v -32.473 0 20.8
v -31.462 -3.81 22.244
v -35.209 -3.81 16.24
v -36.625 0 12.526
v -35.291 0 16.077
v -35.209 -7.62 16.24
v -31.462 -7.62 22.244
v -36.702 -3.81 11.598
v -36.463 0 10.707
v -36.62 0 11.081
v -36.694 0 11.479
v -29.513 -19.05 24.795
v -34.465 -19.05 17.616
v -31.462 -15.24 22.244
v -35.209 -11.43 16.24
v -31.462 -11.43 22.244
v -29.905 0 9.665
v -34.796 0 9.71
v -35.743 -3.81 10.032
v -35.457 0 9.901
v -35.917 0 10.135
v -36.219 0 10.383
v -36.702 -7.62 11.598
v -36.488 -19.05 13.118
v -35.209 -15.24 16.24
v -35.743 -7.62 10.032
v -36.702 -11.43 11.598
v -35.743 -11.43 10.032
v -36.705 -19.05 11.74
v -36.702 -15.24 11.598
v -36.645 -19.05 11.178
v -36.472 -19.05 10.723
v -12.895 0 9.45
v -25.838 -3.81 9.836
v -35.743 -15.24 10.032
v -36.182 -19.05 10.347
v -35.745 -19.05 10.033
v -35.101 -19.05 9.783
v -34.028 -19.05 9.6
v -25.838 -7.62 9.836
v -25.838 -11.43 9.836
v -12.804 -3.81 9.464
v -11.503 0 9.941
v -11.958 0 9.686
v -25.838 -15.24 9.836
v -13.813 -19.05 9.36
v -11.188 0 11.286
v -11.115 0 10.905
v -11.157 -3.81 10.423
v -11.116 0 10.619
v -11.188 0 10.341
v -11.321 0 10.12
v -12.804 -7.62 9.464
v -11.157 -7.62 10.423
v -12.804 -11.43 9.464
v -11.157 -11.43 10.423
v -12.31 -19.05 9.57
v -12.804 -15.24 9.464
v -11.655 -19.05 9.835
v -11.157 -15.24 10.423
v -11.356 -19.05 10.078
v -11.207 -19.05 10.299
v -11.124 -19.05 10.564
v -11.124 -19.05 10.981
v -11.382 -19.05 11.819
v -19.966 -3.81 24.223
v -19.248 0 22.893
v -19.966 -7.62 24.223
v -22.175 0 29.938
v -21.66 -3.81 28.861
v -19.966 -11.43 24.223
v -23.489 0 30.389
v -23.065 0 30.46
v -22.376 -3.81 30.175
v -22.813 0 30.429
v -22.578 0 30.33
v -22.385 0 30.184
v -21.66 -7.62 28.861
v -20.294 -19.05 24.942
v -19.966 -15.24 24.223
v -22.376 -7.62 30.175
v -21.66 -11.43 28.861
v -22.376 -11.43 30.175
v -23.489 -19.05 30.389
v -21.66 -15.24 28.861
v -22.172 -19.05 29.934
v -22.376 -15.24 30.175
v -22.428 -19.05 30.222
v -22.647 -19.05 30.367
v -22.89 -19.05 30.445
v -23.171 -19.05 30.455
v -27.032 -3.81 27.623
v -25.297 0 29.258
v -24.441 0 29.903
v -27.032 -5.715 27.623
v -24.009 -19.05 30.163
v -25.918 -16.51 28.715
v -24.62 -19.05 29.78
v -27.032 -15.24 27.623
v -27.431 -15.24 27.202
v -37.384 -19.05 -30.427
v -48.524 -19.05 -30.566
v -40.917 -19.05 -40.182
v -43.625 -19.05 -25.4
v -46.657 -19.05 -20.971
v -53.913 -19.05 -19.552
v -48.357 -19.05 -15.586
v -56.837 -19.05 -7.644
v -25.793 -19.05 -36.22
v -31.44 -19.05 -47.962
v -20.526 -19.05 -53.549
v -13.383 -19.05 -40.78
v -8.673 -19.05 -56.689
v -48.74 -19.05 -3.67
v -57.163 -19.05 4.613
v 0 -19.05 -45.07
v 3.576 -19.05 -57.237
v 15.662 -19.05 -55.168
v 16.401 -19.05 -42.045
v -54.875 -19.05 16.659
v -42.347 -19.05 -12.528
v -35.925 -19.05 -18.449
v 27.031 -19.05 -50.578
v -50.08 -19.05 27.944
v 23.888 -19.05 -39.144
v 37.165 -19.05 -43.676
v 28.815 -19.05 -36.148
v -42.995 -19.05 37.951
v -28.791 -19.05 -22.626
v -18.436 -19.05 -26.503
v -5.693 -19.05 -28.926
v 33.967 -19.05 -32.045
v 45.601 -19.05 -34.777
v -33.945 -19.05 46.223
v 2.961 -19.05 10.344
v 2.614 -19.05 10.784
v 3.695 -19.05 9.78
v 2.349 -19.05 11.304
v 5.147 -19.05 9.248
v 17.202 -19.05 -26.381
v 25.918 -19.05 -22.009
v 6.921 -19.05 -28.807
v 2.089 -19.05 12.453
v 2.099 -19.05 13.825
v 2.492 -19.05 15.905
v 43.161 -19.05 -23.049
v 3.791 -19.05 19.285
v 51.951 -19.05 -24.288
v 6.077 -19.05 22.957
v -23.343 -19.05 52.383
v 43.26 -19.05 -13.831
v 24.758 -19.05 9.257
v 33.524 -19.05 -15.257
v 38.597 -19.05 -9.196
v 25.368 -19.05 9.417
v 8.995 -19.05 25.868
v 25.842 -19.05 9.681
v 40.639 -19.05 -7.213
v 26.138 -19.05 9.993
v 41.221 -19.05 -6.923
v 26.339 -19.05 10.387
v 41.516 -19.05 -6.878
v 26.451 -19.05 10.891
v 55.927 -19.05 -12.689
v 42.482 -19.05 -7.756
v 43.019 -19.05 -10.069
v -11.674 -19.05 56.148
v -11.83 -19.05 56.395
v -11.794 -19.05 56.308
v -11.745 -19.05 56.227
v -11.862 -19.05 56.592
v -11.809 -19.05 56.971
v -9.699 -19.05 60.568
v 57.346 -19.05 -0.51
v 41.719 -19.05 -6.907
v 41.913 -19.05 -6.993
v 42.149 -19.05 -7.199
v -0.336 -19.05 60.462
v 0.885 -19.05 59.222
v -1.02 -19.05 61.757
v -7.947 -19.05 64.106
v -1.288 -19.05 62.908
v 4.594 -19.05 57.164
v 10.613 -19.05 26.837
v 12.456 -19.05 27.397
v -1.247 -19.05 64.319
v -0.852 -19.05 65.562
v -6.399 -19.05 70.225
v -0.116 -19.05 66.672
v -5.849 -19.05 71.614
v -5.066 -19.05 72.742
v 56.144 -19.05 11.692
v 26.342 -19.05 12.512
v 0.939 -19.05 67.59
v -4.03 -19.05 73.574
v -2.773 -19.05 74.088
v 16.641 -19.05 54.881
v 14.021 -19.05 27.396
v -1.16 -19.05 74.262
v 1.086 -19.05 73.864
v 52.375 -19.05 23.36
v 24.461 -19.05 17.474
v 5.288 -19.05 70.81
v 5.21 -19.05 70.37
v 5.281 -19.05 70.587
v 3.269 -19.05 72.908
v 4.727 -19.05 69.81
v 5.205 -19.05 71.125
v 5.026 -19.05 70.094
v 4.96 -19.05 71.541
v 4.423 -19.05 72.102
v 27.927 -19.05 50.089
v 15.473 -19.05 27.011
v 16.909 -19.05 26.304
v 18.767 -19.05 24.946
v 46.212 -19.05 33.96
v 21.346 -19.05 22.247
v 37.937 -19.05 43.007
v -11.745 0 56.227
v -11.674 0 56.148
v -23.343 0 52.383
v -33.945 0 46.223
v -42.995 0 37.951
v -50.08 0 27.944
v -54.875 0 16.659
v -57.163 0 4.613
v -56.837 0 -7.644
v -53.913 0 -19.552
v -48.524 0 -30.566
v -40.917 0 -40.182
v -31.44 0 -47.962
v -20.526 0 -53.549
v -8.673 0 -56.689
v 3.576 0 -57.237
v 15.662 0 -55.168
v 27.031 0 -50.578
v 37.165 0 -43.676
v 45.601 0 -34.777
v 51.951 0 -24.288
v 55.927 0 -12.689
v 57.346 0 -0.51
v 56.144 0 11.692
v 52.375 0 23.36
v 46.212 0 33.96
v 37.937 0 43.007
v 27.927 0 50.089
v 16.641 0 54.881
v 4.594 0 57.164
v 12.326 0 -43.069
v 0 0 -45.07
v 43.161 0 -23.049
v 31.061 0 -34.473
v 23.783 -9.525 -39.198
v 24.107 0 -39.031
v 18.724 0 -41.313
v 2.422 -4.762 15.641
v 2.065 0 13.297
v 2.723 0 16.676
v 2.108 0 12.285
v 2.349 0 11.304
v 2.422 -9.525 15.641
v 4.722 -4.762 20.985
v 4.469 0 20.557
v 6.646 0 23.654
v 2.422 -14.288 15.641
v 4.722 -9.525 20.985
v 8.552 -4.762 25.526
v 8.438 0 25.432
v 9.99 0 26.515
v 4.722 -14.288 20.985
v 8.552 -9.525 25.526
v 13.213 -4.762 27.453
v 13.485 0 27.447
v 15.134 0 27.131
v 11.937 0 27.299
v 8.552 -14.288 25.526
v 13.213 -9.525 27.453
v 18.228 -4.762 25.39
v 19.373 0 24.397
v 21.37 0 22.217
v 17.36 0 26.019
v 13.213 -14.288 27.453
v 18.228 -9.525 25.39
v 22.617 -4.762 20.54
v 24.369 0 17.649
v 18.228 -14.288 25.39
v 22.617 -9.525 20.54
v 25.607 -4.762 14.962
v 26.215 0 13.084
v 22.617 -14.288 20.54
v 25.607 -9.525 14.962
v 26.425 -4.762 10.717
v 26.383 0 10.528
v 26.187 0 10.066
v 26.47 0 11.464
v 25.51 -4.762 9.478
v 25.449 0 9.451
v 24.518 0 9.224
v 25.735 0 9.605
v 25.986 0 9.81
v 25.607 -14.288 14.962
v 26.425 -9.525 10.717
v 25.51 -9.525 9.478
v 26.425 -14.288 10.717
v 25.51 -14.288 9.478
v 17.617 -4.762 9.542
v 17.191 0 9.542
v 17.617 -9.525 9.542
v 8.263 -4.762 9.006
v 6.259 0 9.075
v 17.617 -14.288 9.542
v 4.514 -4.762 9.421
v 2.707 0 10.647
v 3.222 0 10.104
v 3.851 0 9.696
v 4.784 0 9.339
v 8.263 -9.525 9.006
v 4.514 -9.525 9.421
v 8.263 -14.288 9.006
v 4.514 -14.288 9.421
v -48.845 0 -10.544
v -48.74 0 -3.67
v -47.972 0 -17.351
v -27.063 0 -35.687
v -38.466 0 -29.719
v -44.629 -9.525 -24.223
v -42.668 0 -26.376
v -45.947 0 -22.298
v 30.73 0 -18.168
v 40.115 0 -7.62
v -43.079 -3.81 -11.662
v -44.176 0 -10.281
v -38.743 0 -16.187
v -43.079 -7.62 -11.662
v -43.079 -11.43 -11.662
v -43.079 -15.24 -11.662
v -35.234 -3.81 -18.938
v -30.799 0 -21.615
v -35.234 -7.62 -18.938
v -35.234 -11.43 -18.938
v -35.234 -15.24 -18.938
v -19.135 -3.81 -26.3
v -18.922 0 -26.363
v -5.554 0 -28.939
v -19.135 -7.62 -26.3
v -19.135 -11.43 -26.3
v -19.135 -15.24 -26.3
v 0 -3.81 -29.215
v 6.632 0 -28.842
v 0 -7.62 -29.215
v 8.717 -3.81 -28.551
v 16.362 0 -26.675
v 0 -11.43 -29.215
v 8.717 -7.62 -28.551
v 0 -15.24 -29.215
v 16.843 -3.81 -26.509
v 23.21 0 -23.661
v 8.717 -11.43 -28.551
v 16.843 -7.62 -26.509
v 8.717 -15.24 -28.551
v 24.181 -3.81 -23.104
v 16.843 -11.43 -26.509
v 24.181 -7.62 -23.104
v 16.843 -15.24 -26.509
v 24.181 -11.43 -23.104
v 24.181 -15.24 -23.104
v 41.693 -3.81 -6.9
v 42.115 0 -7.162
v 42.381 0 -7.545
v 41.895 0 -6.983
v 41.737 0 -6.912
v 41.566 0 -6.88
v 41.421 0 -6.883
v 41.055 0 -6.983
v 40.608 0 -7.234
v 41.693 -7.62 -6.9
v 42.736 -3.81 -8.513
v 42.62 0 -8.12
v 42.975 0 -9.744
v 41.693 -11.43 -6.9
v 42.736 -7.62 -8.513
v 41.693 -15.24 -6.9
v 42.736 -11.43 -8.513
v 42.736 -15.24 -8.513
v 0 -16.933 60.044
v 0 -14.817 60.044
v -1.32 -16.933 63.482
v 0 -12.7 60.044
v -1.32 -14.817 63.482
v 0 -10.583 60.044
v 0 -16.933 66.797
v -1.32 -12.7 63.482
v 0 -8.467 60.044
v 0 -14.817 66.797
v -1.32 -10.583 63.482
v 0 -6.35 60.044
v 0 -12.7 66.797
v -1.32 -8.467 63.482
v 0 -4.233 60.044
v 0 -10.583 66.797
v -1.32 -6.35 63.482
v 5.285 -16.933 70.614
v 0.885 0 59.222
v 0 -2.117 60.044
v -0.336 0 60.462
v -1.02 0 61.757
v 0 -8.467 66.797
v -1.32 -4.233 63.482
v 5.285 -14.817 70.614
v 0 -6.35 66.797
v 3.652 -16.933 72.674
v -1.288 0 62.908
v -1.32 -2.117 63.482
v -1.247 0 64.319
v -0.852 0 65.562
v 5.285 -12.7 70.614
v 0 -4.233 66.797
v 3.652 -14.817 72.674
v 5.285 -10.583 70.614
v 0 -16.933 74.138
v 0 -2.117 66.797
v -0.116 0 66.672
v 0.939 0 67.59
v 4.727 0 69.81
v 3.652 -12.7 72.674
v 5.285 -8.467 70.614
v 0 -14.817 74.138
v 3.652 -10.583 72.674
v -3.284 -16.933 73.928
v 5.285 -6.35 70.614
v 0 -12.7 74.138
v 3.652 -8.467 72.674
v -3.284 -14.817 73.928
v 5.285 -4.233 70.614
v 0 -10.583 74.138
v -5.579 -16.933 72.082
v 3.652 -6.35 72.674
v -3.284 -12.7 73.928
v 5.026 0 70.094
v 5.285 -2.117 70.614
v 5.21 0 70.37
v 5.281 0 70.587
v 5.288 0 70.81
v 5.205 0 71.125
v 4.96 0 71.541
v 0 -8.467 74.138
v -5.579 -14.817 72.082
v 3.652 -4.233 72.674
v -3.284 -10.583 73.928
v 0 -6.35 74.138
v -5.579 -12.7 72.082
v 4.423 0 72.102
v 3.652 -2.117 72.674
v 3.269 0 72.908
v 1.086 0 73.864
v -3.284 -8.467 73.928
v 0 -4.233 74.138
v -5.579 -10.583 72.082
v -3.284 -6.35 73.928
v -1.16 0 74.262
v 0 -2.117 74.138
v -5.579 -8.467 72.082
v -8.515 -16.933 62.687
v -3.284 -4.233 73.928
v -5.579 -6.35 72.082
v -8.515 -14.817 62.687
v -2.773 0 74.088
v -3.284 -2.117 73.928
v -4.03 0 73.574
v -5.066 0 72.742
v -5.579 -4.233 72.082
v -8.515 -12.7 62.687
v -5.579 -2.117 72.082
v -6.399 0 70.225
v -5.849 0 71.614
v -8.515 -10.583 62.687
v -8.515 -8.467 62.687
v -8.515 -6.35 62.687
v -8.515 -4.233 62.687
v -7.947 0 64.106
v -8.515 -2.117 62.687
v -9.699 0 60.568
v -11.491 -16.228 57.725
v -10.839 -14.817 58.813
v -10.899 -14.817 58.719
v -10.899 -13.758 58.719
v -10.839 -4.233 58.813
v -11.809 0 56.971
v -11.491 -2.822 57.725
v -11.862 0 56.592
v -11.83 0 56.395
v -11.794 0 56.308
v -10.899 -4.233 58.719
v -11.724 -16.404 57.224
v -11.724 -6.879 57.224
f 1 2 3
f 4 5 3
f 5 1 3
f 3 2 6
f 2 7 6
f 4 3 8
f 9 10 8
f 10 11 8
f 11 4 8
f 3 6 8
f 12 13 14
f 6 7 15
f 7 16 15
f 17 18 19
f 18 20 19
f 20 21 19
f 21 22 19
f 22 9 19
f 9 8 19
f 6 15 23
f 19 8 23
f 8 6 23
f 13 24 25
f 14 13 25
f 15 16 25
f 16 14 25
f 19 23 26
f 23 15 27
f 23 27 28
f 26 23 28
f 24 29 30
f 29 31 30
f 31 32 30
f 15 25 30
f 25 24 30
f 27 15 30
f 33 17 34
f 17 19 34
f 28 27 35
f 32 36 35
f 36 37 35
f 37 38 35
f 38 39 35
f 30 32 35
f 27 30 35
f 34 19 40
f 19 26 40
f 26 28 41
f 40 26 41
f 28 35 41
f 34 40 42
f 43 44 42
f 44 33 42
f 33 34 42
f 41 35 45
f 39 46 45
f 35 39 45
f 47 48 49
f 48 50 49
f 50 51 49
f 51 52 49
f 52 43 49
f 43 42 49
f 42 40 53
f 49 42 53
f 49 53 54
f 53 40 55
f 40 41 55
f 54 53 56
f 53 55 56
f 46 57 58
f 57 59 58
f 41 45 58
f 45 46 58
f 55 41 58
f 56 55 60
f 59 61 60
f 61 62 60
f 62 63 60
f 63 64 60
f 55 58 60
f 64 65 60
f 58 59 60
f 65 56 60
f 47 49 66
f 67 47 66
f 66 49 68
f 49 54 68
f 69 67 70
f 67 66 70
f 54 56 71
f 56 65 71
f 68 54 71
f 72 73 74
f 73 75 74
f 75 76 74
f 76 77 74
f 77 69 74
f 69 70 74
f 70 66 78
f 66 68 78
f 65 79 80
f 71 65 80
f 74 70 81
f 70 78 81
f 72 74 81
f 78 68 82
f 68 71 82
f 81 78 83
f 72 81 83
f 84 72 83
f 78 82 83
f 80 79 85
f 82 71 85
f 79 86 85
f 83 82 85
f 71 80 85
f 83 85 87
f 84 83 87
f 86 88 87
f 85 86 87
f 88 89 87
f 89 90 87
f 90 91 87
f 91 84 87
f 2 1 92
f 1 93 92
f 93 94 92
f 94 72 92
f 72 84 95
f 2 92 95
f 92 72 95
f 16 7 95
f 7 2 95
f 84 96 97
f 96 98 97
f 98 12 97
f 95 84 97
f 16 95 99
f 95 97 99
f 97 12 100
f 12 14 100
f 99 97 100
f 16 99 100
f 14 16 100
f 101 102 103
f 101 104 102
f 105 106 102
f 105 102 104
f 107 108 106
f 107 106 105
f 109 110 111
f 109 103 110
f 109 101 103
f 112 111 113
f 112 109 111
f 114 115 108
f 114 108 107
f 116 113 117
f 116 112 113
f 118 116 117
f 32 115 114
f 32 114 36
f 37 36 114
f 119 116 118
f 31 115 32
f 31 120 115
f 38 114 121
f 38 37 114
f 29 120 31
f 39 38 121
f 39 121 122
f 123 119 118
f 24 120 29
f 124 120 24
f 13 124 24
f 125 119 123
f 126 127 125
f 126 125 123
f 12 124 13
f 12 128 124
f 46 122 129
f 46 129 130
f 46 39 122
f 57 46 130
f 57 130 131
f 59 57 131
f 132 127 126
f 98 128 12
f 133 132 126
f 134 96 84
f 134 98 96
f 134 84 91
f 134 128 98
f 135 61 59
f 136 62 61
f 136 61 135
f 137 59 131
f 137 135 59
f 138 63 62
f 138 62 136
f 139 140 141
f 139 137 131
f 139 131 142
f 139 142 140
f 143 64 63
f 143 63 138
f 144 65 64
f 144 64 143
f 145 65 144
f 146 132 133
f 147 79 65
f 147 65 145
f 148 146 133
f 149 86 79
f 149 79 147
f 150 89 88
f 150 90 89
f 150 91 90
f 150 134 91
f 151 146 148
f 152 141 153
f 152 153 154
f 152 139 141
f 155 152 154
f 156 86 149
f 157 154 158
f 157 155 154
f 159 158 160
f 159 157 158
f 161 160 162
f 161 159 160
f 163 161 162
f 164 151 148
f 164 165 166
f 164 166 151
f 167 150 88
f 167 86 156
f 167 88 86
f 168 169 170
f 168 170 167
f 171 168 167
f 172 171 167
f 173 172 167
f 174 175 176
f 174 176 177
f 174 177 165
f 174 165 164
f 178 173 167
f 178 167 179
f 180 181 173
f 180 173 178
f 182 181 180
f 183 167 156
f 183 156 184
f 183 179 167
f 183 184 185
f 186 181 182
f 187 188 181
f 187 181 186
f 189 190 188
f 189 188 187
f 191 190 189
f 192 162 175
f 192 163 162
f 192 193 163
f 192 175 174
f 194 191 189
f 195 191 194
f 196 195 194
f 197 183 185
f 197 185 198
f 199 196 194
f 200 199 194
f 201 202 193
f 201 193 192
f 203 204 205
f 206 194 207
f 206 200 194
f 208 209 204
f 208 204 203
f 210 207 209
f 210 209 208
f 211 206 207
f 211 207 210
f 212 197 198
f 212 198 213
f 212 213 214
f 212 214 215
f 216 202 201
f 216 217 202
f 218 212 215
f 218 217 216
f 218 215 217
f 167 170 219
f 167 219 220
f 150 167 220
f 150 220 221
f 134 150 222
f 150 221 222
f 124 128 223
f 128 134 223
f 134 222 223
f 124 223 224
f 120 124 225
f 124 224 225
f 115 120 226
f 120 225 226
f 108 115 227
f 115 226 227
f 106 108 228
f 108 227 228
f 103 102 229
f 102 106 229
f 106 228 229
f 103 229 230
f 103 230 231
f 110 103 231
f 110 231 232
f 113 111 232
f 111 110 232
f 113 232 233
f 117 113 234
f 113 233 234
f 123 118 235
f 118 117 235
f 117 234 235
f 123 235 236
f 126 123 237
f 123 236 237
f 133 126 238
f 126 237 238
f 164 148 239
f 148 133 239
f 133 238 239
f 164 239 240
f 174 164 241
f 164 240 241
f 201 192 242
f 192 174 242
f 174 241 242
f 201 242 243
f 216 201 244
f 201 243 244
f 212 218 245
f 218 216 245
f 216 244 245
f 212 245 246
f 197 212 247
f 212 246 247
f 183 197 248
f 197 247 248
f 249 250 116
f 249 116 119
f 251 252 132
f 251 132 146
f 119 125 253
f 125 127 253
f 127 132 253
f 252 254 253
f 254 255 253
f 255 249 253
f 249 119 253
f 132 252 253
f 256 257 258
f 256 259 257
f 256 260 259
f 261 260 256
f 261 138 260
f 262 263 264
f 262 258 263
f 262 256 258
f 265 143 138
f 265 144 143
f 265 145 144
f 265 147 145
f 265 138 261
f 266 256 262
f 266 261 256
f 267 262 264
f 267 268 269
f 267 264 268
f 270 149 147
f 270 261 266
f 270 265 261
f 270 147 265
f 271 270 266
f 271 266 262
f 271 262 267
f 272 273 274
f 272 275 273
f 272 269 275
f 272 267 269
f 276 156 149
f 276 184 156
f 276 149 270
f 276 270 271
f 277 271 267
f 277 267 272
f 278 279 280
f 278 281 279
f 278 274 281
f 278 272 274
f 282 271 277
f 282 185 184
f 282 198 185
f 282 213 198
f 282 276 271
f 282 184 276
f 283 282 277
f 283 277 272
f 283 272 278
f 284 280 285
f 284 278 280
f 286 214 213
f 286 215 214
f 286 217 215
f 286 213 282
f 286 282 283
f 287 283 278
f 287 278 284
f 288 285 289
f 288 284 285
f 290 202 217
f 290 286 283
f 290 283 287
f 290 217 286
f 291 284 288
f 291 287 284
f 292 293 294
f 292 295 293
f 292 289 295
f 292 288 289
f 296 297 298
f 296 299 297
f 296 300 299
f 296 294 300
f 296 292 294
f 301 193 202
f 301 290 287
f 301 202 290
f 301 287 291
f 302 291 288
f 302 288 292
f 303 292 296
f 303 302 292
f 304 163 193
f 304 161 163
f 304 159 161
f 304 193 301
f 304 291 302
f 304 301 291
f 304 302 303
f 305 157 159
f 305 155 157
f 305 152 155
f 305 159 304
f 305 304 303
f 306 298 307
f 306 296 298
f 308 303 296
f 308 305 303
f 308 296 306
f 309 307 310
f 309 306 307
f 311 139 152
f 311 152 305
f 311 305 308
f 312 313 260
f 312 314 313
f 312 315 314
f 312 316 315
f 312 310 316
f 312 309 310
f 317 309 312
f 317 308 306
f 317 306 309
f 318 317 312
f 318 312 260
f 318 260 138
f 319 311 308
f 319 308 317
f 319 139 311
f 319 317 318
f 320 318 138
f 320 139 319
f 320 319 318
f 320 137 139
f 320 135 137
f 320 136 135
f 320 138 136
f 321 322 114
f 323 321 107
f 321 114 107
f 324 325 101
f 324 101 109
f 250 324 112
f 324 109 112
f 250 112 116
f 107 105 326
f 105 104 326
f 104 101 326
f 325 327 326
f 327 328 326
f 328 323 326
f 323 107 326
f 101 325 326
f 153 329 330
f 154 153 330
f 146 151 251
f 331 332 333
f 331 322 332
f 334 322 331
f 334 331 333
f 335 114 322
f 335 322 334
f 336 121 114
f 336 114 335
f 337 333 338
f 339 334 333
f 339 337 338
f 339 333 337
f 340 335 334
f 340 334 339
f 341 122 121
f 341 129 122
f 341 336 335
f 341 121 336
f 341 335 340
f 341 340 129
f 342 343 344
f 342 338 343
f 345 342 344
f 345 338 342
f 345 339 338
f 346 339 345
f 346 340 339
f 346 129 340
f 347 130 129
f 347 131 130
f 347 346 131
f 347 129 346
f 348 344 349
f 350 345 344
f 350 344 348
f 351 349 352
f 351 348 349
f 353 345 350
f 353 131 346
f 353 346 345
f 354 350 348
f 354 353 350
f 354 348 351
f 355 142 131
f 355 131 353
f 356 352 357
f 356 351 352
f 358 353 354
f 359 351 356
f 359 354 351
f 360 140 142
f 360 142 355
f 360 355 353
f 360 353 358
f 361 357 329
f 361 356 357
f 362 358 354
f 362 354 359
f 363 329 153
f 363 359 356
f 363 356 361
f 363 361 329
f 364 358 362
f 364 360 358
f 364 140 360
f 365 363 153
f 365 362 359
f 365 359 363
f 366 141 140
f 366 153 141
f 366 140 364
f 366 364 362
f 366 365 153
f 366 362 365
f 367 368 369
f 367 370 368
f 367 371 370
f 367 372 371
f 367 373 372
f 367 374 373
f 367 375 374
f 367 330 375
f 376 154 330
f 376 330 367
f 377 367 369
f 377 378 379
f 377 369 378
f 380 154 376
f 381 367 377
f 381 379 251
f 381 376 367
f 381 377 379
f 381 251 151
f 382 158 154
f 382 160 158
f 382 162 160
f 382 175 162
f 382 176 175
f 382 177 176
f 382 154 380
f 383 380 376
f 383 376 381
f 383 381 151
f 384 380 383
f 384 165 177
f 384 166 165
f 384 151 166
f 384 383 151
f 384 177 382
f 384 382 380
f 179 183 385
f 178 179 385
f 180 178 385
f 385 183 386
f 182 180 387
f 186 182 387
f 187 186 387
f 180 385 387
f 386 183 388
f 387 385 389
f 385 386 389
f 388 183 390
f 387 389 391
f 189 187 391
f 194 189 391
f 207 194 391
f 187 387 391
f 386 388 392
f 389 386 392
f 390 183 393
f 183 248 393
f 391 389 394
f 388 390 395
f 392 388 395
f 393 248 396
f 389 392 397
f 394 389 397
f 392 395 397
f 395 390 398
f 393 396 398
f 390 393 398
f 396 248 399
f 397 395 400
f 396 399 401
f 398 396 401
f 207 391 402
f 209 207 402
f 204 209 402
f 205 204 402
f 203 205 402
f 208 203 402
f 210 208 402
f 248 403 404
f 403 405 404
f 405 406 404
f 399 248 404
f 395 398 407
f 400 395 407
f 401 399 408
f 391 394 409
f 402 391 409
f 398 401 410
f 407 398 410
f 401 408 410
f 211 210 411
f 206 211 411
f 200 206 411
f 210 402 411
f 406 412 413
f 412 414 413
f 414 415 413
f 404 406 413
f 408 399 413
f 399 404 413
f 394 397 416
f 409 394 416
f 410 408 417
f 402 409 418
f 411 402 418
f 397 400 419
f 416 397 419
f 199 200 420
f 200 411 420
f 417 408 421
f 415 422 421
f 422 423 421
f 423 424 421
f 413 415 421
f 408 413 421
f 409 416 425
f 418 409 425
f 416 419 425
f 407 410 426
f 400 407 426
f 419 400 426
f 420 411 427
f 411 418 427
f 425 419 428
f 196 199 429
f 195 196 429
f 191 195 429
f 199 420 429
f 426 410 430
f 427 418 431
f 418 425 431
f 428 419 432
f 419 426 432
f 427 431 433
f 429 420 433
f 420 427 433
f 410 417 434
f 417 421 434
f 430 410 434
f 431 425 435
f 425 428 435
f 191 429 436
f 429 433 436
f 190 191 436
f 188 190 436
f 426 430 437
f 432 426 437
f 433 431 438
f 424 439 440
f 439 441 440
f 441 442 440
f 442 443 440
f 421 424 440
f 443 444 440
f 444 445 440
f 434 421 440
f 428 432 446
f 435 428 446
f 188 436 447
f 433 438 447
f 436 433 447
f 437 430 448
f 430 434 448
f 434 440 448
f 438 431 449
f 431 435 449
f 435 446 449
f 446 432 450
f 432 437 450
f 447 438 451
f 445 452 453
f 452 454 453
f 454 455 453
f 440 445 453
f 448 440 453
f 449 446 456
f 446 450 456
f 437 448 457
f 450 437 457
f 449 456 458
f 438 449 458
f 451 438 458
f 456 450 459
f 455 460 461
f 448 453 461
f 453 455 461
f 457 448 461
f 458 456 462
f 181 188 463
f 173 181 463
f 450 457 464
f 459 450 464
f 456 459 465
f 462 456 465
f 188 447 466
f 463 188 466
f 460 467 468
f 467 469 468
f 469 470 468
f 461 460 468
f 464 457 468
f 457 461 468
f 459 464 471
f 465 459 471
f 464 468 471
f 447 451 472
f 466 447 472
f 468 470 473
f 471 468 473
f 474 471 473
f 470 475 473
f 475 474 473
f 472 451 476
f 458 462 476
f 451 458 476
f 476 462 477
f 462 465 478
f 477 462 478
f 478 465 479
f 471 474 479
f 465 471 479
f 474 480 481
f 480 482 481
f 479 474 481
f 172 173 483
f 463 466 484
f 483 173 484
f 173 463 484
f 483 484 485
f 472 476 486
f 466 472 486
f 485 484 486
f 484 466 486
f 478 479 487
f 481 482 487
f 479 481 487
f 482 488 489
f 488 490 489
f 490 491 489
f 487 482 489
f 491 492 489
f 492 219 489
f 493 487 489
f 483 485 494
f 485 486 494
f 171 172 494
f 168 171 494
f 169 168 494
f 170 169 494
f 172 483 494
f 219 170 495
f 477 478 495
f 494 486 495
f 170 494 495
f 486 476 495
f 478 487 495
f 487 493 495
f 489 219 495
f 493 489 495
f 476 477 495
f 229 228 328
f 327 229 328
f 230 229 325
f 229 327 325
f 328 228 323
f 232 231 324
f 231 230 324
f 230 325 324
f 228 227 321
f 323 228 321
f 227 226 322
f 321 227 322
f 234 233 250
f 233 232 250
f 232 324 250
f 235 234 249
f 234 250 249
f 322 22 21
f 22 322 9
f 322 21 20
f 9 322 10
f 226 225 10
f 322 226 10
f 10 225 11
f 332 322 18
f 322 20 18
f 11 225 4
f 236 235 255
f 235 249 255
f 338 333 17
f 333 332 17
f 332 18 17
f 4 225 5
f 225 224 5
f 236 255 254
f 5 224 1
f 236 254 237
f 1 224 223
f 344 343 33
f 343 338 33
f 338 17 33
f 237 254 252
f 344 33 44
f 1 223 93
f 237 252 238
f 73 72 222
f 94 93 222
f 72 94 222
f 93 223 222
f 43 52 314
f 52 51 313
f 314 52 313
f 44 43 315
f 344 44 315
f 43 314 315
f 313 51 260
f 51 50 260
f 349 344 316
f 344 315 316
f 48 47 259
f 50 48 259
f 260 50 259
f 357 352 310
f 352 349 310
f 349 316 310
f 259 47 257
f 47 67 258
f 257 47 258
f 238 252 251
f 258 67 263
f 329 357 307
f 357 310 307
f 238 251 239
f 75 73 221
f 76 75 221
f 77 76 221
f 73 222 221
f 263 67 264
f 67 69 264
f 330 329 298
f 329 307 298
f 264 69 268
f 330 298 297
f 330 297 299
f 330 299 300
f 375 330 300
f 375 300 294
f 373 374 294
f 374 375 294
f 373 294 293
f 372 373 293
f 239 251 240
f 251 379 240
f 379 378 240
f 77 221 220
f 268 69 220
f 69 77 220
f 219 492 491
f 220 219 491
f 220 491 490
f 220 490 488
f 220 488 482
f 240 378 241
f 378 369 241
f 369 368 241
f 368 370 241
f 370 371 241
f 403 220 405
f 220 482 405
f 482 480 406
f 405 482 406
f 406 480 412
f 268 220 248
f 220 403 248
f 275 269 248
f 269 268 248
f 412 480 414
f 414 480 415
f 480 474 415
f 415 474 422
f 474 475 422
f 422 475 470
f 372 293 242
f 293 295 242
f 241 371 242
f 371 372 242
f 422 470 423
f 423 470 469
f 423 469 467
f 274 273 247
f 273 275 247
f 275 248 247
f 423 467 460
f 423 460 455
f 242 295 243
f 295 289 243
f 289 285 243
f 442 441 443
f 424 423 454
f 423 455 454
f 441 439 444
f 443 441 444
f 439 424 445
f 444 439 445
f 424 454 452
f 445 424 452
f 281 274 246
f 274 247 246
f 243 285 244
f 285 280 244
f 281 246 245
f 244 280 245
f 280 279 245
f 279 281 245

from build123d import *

# Parameters (mm, degrees)
F0_R     = 57.3483289895
F1_DEPTH = 19.05
F3_DEPTH = 25.4
F5_DEPTH = 25.4
F7_DEPTH = 19.05


with BuildPart() as f1:
    # F0 (on Front) → F1 (new body)
    with BuildSketch(Plane.XZ):
        Circle(F0_R)
    extrude(amount=F1_DEPTH)

    # F2 (on face) → F3 (cut)
    with BuildSketch(Plane.XZ.offset(19.05)):
        with BuildLine():
            add(Edge.make_bspline(
                [(-23.4891753644, 30.3891189396), (-26.9243462131, 29.3261471725), (-43.8241472686, 6.7674878607), (-25.7144645045, 11.219787571), (-3.9489905031, 6.7260151454), (-21.870073942, 22.9172690362), (-21.5791825731, 30.9801429387), (-23.4891753644, 30.3891189396)],
                knots=[0, 0, 0, 0, 0.2569281893, 0.434766476, 0.6402442022, 0.8571450996, 1, 1, 1, 1], degree=3))
        make_face()
        with BuildLine():
            add(Edge.make_bspline(
                [(2.3489200976, 11.3041652367), (0.6518734071, 15.6093314814), (13.1405461793, 39.8038013278), (31.7417025879, 6.2437005075), (17.3532122345, 11.1919894341), (3.8569723329, 7.4784510619), (2.3489200976, 11.3041652367)],
                knots=[0, 0, 0, 0, 0.2769288375, 0.5667888033, 0.7539118076, 1, 1, 1, 1], degree=3))
        make_face()
    extrude(amount=-F3_DEPTH, mode=Mode.SUBTRACT)

    # F4 (on face) → F5 (cut)
    with BuildSketch(Plane.XZ.offset(19.05)):
        with BuildLine():
            add(Edge.make_bspline(
                [(-48.7400367856, -3.6701834761), (-45.2089169003, -9.0776656429), (-36.9396806976, -21.7409987361), (0.3583468312, -33.1698702748), (30.44288108, -22.9968507414), (43.7507924182, 0.4321353545), (43.3582988271, -15.2033765472), (43.1613586843, -23.0487529188)],
                knots=[0, 0, 0, 0, 0.1858644389, 0.435260483, 0.6696244944, 0.8342286328, 1, 1, 1, 1], degree=3))
            add(Edge.make_bspline(
                [(-48.7400367856, -3.6701834761), (-49.0149064772, -10.9787822738), (-49.7111522028, -29.4914842131), (-18.742555771, -39.1963541969), (0, -45.0698547065)],
                knots=[0, 0, 0, 0, 0.3947883362, 1, 1, 1, 1], degree=3))
            add(Edge.make_bspline(
                [(0, -45.0698547065), (8.3152344196, -43.9431045773), (25.0683890157, -41.6729798697), (37.1009966236, -29.2870631847), (43.1613586843, -23.0487529188)],
                knots=[0, 0, 0, 0, 0.4963384282, 1, 1, 1, 1], degree=3))
        make_face()
    extrude(amount=-F5_DEPTH, mode=Mode.SUBTRACT)

    # F6 (on Front) → F7 (join)
    with BuildSketch(Plane.XZ):
        with BuildLine():
            add(Edge.make_bspline(
                [(-11.7445876822, 56.2272109091), (-10.8549881926, 55.0305335455), (-0.4754771669, 57.598890257), (8.119414425, 56.1149537556), (-1.7910564131, 59.2320467817), (-1.728184934, 67.8446462416), (8.4481205684, 70.0633250708), (-0.3355573929, 75.4010266697), (-7.0755293062, 72.8011766288), (-6.865462498, 62.8374485579), (-12.4417473706, 57.1650208199), (-11.7445876822, 56.2272109091)],
                knots=[0, 0, 0, 0, 0.141981767, 0.237166611, 0.3402103238, 0.447806184, 0.5535227706, 0.657872915, 0.7588278557, 0.8887319905, 1, 1, 1, 1], degree=3))
        make_face()
    extrude(amount=F7_DEPTH)


solid = f1.part
